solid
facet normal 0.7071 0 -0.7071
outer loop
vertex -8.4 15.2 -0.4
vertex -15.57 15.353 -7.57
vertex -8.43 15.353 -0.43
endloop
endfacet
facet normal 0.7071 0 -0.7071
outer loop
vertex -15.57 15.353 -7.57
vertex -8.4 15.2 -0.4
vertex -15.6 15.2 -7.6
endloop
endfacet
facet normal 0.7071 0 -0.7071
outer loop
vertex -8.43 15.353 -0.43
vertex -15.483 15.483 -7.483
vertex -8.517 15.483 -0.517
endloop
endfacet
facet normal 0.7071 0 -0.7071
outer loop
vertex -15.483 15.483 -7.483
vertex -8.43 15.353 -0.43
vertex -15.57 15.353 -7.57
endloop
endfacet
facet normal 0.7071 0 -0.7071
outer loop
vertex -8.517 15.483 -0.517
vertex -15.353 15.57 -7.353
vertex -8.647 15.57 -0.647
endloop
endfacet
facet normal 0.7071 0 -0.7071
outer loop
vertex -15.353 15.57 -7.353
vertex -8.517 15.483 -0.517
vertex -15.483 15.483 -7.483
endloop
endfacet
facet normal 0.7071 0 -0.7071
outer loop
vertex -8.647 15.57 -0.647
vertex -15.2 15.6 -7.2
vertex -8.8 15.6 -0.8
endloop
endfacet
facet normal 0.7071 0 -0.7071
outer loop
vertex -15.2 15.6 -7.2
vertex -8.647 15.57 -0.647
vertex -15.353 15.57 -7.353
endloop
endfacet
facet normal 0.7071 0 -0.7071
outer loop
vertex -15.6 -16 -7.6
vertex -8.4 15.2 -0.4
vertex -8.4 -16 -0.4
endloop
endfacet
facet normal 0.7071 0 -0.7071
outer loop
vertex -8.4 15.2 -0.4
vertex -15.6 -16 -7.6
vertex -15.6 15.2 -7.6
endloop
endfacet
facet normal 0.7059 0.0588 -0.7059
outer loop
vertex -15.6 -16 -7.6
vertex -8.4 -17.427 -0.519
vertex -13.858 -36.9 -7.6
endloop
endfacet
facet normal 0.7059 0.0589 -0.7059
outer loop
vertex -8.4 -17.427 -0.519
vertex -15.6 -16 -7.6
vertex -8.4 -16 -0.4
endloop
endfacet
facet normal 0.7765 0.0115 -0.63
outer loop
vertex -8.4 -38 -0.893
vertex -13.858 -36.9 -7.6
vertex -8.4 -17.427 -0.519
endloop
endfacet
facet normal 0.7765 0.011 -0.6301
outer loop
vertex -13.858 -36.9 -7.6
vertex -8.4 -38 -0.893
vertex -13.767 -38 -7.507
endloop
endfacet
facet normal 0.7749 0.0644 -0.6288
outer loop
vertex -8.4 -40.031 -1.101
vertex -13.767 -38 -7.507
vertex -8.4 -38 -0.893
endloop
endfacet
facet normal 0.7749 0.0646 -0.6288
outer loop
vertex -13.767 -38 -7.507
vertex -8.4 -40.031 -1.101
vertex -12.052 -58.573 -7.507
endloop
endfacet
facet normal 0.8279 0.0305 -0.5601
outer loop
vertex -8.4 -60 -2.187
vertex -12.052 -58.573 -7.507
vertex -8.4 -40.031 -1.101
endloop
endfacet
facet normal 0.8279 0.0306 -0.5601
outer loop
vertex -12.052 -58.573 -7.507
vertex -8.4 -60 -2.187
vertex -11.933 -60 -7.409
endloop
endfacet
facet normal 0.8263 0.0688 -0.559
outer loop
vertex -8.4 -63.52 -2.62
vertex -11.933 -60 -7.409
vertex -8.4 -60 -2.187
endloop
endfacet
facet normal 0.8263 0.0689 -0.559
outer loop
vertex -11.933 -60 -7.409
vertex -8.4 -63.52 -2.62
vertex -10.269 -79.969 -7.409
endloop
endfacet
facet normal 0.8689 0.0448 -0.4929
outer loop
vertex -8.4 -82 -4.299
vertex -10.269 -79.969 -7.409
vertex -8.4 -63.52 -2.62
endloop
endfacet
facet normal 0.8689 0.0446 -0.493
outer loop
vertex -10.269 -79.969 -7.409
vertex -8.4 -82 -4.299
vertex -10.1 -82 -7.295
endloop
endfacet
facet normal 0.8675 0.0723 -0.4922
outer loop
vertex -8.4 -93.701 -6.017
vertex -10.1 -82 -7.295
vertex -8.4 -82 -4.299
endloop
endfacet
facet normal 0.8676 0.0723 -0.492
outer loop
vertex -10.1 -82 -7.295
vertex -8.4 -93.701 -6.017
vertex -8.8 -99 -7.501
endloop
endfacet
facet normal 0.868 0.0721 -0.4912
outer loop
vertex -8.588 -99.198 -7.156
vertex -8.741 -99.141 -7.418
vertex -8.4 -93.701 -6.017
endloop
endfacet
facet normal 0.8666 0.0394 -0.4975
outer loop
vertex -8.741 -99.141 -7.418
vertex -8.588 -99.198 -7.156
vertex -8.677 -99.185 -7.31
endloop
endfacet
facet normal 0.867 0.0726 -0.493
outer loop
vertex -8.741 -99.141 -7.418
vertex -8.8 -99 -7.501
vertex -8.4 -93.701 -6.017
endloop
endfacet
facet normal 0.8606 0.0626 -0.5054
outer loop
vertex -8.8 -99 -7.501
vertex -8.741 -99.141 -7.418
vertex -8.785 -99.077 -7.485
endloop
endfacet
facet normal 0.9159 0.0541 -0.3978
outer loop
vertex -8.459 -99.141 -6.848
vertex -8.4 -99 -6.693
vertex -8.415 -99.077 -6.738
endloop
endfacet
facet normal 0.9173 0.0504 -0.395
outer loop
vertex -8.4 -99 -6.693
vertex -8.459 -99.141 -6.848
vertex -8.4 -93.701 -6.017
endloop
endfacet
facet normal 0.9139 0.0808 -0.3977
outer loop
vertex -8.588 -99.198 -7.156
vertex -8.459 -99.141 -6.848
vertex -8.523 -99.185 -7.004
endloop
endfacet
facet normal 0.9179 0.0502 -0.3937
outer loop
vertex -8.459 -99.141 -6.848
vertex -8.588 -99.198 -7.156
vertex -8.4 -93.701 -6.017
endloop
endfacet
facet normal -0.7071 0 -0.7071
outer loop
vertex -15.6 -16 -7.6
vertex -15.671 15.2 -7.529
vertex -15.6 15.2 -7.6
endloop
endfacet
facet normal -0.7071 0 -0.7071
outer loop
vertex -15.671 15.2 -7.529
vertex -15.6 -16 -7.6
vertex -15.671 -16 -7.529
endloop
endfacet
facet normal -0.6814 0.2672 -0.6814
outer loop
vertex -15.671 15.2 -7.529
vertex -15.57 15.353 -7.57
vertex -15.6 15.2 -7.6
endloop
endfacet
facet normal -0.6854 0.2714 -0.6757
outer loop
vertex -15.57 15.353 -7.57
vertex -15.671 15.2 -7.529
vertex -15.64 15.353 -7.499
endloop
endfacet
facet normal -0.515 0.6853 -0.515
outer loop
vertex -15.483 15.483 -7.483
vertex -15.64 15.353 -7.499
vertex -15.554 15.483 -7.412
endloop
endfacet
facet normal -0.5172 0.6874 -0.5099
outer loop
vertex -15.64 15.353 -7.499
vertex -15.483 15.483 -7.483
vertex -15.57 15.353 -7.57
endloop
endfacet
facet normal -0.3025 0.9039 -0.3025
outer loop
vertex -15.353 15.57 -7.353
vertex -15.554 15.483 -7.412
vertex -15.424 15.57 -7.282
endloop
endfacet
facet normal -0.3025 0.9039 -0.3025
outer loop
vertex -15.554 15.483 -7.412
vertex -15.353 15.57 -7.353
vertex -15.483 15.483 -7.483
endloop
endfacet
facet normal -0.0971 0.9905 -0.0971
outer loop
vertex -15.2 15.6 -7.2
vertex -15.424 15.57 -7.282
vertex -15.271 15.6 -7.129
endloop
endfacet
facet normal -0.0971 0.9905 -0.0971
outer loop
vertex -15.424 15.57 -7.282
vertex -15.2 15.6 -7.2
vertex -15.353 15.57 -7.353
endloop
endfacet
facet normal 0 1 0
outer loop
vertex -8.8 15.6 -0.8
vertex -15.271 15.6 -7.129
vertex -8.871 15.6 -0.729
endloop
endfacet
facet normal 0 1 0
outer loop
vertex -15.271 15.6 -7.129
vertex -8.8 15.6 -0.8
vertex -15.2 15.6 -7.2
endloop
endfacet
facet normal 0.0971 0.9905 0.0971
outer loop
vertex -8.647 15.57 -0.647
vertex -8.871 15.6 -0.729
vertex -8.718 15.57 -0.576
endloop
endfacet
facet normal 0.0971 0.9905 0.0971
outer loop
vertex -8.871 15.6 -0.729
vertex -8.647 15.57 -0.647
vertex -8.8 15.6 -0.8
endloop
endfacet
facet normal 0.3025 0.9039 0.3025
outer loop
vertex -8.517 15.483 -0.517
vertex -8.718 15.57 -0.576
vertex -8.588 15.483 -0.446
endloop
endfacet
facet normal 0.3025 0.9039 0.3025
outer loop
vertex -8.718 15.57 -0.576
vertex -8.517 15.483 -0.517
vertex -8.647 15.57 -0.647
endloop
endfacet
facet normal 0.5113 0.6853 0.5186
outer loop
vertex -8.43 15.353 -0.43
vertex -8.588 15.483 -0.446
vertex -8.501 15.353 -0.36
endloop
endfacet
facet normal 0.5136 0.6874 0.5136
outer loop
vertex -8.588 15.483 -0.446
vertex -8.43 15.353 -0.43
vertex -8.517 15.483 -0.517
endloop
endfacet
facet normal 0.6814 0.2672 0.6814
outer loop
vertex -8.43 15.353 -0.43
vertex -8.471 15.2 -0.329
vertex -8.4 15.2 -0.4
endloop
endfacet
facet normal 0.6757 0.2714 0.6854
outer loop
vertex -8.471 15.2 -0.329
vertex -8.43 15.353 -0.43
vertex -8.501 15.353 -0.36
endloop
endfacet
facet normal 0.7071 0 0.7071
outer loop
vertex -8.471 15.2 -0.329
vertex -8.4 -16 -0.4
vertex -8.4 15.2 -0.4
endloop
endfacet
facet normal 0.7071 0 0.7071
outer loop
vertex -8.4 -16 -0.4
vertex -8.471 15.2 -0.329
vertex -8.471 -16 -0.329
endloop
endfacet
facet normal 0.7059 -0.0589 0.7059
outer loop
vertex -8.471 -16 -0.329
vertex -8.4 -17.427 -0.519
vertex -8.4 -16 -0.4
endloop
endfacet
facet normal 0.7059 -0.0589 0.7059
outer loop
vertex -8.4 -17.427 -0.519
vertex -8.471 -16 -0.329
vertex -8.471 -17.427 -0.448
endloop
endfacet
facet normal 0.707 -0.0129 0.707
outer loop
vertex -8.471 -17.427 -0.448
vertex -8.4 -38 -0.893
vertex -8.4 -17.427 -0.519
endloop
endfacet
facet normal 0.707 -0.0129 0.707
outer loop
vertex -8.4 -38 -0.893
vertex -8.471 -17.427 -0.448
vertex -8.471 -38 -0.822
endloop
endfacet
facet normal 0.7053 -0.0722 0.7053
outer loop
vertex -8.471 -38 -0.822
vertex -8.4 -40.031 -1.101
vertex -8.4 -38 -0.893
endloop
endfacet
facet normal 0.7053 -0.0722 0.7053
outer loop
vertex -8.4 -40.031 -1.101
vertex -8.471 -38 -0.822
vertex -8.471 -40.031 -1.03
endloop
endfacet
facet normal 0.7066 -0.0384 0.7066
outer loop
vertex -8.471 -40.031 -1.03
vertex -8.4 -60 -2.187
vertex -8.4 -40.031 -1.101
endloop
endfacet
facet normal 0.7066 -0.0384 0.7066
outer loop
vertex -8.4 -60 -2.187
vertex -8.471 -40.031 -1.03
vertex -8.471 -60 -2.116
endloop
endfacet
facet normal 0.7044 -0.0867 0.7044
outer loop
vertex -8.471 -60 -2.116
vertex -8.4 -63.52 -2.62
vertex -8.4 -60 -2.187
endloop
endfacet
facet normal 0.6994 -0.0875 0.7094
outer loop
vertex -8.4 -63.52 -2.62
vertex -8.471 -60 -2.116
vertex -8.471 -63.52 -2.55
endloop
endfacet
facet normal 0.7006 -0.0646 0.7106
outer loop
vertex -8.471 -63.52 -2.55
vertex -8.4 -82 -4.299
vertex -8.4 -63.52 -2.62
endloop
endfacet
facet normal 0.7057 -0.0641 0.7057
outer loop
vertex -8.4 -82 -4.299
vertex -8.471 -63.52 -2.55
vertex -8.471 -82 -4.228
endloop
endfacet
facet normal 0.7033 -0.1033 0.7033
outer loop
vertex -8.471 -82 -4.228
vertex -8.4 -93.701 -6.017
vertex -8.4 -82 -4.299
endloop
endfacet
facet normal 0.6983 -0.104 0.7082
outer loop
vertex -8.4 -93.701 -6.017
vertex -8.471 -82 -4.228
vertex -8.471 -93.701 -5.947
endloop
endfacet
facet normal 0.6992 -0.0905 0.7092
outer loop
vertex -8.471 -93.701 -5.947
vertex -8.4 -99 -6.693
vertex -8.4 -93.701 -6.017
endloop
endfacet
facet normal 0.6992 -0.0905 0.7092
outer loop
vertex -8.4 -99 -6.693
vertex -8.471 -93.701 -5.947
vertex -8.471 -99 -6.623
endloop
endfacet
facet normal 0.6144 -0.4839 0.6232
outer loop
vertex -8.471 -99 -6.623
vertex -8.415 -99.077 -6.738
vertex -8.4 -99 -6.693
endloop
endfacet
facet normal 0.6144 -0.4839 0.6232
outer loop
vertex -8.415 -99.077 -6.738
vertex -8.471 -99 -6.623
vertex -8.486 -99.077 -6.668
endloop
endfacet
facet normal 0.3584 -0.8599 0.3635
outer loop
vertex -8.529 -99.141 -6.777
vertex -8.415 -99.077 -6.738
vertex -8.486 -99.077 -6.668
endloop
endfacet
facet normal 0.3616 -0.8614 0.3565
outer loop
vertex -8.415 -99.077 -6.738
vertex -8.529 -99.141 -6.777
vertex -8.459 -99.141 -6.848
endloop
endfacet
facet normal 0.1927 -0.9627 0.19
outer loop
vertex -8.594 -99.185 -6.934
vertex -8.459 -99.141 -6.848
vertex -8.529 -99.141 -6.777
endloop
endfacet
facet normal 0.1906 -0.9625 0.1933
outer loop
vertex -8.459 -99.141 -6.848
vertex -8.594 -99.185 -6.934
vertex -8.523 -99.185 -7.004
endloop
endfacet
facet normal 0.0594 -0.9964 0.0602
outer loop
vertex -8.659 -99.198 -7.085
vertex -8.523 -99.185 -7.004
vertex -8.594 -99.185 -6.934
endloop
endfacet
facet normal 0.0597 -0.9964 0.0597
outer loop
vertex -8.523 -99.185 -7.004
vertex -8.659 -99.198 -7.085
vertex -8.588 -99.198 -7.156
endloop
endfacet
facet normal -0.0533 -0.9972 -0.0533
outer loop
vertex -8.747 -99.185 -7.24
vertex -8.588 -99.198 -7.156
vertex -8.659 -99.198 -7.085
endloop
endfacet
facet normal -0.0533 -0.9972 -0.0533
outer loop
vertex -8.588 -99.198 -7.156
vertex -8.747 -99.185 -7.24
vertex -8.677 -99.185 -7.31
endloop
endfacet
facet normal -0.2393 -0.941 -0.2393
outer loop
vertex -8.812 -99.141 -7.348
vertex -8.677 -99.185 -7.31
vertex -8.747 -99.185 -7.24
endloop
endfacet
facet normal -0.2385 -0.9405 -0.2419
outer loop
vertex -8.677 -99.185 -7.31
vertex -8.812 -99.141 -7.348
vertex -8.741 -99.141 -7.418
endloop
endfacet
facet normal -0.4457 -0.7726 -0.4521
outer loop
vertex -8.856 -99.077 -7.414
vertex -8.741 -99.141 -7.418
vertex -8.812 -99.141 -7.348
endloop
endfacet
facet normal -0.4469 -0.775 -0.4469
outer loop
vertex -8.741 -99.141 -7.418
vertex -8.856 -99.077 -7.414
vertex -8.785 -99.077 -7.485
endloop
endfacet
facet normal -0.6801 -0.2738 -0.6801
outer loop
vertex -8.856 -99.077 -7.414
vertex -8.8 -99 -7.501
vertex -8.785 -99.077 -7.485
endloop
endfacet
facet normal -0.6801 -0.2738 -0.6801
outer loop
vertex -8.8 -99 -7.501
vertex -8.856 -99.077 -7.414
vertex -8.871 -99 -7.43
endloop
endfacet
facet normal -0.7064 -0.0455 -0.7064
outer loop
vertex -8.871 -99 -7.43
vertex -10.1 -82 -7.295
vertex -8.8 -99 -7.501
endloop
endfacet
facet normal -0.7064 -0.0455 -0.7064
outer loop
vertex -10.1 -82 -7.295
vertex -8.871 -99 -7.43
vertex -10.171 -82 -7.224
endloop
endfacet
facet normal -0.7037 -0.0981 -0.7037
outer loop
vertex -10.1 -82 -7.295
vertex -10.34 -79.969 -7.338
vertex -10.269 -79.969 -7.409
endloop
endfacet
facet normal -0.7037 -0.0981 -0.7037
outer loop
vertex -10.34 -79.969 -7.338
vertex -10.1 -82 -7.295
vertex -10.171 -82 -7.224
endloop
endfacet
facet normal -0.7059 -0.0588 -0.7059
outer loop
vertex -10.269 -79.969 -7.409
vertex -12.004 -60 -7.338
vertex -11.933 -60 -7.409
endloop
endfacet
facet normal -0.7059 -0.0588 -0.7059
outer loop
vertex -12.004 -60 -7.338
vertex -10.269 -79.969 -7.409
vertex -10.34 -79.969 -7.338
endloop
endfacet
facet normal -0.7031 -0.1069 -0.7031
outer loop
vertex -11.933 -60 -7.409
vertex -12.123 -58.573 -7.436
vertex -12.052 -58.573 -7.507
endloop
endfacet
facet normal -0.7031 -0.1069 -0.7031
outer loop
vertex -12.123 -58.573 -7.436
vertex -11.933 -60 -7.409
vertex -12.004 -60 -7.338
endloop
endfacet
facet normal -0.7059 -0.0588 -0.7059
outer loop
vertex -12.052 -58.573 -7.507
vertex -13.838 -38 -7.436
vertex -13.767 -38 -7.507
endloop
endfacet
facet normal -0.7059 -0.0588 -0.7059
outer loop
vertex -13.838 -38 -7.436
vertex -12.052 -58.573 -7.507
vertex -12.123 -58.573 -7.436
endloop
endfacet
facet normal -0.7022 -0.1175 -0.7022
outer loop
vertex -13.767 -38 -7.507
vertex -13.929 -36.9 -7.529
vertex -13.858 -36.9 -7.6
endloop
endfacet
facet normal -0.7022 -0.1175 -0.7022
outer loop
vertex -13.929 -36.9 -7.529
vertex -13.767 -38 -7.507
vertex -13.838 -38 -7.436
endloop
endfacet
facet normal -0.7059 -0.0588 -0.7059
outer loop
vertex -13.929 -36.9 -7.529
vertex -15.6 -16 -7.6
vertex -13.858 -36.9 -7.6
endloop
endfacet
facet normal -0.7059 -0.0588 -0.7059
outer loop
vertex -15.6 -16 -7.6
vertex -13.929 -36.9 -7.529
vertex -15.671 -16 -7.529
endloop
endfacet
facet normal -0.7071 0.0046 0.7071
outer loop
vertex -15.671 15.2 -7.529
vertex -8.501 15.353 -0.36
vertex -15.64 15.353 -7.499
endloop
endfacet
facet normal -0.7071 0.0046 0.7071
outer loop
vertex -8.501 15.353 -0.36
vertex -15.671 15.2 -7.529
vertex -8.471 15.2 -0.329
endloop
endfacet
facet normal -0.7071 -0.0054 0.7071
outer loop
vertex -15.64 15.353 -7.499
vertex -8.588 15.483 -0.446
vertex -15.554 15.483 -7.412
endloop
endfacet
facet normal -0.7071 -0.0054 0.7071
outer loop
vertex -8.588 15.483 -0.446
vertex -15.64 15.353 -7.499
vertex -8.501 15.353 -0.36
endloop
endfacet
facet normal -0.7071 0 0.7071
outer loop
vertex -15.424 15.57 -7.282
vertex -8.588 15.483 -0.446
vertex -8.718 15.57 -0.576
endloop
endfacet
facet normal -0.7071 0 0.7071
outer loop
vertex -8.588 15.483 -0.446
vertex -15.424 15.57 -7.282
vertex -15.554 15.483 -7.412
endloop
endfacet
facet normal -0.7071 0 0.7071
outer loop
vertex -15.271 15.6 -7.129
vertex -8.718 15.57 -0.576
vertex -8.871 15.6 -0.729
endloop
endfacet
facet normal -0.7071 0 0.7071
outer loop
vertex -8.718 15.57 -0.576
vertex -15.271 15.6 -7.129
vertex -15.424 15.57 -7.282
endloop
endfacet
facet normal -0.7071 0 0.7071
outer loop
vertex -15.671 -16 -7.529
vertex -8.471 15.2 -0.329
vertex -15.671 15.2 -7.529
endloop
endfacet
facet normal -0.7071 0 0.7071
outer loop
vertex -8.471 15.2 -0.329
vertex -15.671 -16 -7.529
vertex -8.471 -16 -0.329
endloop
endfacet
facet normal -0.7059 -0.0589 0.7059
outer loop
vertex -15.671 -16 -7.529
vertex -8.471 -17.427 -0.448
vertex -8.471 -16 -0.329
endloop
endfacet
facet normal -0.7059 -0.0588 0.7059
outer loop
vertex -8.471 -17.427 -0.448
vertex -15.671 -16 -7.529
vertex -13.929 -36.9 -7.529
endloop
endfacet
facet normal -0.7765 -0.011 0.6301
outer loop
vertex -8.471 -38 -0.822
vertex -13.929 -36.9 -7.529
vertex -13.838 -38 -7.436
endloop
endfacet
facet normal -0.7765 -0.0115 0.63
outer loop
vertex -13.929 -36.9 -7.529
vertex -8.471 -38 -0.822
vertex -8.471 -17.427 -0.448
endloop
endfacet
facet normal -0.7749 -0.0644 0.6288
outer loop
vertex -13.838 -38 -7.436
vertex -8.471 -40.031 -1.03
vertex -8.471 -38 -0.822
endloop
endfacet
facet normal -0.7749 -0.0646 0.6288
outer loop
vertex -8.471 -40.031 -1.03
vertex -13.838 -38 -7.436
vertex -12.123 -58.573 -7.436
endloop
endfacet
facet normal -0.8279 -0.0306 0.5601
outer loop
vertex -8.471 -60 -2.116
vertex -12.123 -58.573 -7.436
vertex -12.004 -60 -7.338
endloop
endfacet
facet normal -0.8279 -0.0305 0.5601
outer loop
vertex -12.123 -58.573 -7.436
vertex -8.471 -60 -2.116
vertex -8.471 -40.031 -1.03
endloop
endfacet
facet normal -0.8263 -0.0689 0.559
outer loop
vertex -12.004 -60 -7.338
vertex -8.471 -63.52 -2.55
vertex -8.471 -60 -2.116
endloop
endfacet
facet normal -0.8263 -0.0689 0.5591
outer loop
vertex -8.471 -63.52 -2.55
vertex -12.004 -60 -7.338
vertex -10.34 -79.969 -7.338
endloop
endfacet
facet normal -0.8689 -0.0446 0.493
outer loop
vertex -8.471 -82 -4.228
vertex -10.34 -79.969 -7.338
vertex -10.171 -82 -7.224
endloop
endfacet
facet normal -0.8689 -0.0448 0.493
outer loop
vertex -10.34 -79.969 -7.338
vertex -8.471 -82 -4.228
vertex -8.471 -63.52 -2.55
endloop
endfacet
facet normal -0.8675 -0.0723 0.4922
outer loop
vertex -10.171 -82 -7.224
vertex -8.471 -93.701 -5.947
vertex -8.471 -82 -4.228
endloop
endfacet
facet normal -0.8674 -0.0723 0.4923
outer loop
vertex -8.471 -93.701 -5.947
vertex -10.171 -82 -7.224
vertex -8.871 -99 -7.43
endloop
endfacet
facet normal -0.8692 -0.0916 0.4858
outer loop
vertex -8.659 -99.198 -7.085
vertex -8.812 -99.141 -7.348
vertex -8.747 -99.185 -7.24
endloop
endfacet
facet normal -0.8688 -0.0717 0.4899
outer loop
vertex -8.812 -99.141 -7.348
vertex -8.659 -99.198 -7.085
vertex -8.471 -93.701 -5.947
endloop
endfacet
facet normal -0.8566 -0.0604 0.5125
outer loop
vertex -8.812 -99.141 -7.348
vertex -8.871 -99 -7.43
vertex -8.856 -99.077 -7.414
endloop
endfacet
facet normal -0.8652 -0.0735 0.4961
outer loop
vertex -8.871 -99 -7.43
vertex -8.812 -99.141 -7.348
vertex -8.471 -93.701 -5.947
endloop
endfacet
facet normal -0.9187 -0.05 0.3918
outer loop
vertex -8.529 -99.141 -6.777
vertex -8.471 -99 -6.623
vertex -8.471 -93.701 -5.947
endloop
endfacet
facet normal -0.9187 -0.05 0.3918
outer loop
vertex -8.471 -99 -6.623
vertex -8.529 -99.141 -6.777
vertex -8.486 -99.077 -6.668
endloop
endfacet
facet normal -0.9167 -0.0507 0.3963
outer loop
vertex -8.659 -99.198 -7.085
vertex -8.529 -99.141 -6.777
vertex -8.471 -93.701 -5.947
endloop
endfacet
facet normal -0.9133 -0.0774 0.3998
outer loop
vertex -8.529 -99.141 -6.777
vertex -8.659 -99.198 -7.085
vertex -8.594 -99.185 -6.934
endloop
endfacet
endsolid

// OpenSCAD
use <../lib.scad>
use <6347356qc01.scad>
function ldraw_lib__6347356pc01() = [
// 0 Sticker  1.1 x 14.1 Triangular Right Dark Red (Formed)
// 0 Name: 6347356pc01.dat
// 0 Author: Evert-Jan Boer [ejboer]
// 0 !LDRAW_ORG Part UPDATE 2025-08
// 0 !LICENSE Licensed under CC BY 4.0 : see CAreadme.txt
// 
// 0 BFC CERTIFY CCW
  [0,"BFC","CERTIFY"],
  [0,"BFC","CCW"],
// 
// 0 !KEYWORDS Republic Gunship, Set 75309, Star Wars
// 
// 0 !HISTORY 2025-08-31 [OrionP] Official Update 2025-08
// 
// 1 16 0 0 0 -1 0 0 0 1 0 0 0 1 6347356qc01.dat
  [1,16,0,0,0,-1,0,0,0,1,0,0,0,1, ldraw_lib__6347356qc01()],
];
module ldraw_lib__6347356pc01(step=0, col=false, unit=2/5, alt=false, line=0.2, solid=!$preview)
    makepoly(ldraw_lib__6347356pc01(), step=step, col=col, unit=unit, alt=alt, line=line, solid=solid);
ldraw_lib__6347356pc01(line=0.2);
